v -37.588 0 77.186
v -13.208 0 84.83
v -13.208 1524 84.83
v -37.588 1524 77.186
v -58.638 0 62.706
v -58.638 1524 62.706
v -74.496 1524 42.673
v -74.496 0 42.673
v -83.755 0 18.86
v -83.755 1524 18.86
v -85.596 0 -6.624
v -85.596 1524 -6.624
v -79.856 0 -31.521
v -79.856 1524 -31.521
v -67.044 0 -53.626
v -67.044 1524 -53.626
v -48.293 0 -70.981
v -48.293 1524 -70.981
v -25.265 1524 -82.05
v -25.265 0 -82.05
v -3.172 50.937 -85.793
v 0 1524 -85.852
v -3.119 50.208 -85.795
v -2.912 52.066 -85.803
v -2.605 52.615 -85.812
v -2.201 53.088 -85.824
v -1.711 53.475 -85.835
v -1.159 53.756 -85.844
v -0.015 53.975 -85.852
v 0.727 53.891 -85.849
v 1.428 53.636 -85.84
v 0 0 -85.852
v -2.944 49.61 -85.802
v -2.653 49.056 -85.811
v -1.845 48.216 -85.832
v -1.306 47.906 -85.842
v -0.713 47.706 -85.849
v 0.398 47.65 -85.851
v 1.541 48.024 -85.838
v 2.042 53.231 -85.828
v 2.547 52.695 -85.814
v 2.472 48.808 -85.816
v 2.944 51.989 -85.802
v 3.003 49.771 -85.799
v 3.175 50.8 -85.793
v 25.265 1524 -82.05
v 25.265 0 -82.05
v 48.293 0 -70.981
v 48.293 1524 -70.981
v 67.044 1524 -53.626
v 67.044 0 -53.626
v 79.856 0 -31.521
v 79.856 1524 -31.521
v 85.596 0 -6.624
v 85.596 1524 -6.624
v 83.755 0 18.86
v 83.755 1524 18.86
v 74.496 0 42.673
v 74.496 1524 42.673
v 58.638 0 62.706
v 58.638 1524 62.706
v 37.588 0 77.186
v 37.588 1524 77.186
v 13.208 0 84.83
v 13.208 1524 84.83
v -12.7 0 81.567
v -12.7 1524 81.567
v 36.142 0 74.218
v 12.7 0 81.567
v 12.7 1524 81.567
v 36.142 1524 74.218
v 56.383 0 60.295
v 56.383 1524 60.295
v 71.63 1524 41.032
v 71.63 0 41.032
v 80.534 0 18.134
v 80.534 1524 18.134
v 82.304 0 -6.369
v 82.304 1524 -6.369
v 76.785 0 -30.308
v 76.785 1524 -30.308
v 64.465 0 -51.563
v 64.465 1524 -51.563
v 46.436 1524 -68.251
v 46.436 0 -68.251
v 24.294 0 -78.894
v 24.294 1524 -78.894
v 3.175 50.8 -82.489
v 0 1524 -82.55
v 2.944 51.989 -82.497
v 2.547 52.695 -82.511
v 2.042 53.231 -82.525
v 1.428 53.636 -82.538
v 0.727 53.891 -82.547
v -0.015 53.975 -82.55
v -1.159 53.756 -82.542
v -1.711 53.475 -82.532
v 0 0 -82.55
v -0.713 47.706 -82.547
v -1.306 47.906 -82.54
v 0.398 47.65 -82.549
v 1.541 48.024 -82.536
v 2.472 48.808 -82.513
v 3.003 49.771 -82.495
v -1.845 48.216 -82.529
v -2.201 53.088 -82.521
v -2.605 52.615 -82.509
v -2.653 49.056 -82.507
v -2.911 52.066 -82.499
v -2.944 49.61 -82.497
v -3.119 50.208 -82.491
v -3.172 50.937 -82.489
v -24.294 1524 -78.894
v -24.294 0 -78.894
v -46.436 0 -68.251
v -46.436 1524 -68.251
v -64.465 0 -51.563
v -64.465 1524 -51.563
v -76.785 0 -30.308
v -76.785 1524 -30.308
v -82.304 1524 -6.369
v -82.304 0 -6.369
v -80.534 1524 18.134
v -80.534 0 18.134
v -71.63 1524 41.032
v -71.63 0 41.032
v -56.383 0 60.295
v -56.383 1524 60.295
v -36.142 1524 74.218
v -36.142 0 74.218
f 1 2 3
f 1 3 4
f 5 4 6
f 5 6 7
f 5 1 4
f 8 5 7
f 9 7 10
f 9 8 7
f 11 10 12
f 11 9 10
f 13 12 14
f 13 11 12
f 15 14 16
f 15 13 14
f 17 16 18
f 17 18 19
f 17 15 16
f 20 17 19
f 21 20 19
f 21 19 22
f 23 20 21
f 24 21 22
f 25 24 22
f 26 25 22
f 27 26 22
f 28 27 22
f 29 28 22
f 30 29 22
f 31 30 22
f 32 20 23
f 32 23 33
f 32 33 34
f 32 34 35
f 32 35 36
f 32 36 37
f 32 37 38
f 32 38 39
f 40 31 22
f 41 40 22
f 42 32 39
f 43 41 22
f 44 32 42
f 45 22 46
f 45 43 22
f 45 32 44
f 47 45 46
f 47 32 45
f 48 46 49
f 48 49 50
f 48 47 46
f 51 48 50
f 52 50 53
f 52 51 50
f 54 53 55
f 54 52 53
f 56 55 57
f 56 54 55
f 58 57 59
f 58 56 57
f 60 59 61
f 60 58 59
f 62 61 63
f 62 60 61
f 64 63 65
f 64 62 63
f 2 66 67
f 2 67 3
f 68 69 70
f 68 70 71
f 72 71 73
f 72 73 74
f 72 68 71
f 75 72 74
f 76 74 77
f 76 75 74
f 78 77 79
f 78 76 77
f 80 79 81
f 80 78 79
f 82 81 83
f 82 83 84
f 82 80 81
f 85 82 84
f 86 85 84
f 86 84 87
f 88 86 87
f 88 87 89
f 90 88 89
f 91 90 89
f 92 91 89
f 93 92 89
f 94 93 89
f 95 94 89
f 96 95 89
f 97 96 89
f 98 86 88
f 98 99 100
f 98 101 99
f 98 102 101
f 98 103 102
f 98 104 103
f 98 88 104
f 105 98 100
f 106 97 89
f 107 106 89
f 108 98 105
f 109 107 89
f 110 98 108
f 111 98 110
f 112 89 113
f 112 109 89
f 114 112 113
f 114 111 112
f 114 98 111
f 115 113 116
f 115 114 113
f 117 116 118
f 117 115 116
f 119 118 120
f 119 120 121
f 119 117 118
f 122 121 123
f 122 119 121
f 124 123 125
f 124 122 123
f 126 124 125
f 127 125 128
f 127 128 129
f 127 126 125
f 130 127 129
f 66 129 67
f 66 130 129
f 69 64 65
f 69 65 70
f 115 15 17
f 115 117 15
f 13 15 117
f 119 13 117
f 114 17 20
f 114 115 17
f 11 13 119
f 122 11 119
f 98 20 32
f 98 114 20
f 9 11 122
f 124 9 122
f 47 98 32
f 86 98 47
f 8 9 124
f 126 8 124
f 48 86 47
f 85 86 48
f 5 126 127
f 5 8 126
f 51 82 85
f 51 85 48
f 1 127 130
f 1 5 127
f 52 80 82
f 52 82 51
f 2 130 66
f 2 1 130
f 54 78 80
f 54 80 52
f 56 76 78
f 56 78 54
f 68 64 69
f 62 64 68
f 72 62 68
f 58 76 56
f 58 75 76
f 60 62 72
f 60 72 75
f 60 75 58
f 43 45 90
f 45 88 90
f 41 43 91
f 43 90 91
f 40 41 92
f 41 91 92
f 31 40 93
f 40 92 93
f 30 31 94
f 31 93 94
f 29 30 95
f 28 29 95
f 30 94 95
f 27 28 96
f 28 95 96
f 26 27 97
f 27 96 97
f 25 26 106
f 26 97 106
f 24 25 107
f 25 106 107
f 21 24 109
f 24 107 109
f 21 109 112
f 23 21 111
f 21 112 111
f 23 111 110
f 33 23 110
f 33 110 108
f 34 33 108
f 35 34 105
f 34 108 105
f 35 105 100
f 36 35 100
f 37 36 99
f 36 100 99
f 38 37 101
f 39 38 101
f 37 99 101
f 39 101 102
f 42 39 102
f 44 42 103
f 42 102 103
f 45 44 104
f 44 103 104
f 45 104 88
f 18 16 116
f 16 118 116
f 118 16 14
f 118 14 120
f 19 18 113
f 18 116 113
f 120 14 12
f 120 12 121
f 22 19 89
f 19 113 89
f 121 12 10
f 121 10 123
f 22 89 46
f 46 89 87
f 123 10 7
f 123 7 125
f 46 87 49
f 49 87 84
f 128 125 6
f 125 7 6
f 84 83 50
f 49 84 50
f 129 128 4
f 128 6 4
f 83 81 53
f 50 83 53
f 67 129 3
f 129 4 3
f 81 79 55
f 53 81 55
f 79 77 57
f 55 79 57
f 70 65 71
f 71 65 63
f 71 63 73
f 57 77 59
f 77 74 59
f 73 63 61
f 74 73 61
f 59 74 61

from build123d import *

# Parameters (mm, degrees)
F1_DEPTH = 1524
F2_R     = 3.175
F3_DEPTH = 381


with BuildPart() as f1:
    # F0 (on Front) → F1 (new body)
    with BuildSketch(Plane.XZ):
        with BuildLine():
            Line((-12.7, 81.567227), (-13.208, 84.829916))
            ThreePointArc((-13.208, 84.829916), (0, -85.852), (13.208, 84.829916))
            Line((13.208, 84.829916), (12.7, 81.567227))
            ThreePointArc((12.7, 81.567227), (0, -82.55), (-12.7, 81.567227))
        make_face()
    extrude(amount=-F1_DEPTH)

    # F2 (on Top) → F3 (cut, symmetric)
    with BuildSketch(Plane.XY):
        with Locations((0, 50.8)):
            Circle(F2_R)
    extrude(amount=F3_DEPTH, both=True, mode=Mode.SUBTRACT)


solid = f1.part
